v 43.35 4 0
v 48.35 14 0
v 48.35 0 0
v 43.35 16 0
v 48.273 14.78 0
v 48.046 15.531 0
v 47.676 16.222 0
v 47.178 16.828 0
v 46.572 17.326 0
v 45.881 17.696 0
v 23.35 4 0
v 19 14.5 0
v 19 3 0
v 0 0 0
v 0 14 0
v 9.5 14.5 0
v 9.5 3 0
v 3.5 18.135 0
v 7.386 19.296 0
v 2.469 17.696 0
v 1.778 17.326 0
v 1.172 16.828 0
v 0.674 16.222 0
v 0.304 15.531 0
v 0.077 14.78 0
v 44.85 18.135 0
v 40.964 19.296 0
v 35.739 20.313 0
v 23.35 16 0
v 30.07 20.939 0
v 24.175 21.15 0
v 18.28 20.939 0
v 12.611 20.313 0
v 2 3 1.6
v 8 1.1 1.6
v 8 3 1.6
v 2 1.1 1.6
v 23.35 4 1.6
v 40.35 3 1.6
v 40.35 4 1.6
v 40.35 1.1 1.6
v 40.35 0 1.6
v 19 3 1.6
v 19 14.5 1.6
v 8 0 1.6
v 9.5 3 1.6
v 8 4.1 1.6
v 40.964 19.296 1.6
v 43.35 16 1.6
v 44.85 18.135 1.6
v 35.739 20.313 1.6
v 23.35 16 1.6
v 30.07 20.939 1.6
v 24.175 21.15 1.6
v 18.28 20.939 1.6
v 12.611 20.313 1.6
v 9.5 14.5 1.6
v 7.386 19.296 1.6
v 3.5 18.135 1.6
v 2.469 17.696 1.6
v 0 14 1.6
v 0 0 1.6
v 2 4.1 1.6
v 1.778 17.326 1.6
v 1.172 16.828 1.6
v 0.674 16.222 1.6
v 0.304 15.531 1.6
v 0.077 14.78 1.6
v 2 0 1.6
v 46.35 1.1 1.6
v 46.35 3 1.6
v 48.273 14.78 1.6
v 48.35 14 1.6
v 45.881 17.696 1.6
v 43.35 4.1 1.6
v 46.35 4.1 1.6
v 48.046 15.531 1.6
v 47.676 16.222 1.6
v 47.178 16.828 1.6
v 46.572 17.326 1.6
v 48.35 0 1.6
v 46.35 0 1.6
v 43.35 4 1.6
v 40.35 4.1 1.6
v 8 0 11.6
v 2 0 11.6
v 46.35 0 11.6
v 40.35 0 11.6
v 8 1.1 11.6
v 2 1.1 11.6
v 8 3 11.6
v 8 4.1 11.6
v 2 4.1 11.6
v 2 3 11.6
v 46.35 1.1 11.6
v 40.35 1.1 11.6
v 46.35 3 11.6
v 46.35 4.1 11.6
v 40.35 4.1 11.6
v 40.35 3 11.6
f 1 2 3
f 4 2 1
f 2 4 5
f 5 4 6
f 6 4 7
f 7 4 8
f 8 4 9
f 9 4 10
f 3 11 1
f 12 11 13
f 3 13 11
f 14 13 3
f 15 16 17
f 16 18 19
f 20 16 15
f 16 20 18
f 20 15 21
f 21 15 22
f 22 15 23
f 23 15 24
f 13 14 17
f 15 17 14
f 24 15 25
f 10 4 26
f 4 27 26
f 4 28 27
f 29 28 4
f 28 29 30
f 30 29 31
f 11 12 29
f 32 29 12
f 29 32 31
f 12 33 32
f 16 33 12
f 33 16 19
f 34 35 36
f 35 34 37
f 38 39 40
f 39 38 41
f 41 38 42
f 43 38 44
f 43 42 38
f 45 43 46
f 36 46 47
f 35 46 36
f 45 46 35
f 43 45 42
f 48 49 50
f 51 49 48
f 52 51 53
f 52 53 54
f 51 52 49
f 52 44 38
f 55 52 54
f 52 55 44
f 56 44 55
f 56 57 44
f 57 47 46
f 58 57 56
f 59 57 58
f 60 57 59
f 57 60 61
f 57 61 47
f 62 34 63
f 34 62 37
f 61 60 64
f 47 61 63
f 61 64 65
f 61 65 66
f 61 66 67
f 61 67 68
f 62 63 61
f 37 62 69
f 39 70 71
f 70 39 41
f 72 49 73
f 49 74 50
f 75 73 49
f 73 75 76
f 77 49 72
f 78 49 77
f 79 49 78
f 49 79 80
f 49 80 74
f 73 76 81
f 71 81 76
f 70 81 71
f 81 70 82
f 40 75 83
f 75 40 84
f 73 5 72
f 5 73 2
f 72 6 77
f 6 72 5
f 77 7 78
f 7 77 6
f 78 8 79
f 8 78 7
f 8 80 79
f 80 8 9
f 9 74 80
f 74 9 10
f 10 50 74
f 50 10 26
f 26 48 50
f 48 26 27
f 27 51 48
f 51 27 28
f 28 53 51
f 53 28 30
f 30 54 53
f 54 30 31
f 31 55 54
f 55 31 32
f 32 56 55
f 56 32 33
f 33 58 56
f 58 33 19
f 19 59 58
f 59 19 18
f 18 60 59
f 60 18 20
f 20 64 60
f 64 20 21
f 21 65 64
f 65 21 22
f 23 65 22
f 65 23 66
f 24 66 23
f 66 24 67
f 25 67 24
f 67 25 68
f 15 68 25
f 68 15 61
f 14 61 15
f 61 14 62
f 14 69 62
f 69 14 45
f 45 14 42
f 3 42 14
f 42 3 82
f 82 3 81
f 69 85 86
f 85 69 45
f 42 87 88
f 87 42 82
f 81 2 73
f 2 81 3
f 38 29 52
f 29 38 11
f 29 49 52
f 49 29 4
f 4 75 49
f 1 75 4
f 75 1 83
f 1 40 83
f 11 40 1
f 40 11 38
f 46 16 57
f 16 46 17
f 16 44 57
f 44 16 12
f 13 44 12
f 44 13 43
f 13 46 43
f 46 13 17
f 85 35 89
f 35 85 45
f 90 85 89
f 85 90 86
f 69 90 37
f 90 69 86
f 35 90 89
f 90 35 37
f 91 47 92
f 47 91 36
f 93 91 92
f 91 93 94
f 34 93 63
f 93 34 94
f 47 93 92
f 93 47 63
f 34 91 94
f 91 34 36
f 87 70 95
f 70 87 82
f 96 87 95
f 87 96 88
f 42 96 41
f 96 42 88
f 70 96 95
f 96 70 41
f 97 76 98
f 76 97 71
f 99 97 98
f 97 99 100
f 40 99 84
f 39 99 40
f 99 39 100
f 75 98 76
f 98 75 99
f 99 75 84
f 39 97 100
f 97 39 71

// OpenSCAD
include <../libs/pw_primitives.scad>;

$fn = 32;
body_length=78;
body_width=58;
body_height=26.1;
body_fillet_radius=9.5;
base_width=71;
base_wid_offset = (base_width-body_width)/2;
base_thick=2.2;
bolt_offset = 5;
batt_space_length = 70;
batt_space_width = 50;
batt_space_height = 20;
batt_splen_offset = (body_length-batt_space_length)/2;
batt_spwid_offset = (body_width-batt_space_width)/2;
step_width=63.7;
step_thick=5;  // from bottom, not from top of base
step_offset = (base_width-step_width)/2;
tab_cyl_height = 3;
tab_cyl_diam = 30;
tab_cyl_length = 10;
tab_cyl_inset_height = 1;
bolt_head_len = 4;
bolt_shaft_len = 16;

// The actual Trend AirShield battery pack has a solid top box with clips on the
// lower edge, and then the bottom piece has the base and step and holes for the clips.
// For ease of 3D printing and ease of assembly we follow that basic design but
// use bolt / screw holes instead of clips.  The base and step is one part,
// and the top walls, curved top and tab are the other.  Bolts screw in from underneath
// the base to hold the top on.  The top has the cut-outs for the terminals.

module base_bolt(x, y) {
    translate([x, y, (bolt_head_len+bolt_shaft_len-0.01)])
      mirror([0, 0, 1]) flat_head_bolt_hole(3, bolt_shaft_len, 6, bolt_head_len);
};

// The base:
* difference() {
    union() {
        // base
        cube([body_length, base_width, base_thick]);
        // step
        translate([0, step_offset, base_thick])
          cube([body_length, step_width, step_thick]);
    };
    // bolt holes
    base_bolt(bolt_offset, step_offset+bolt_offset);
    base_bolt(body_length-bolt_offset, step_offset+bolt_offset);
    base_bolt(bolt_offset, step_offset+step_width-bolt_offset);
    base_bolt(body_length-bolt_offset, step_offset+step_width-bolt_offset);
};

// The top:
//translate([0, base_width+10, 0]) 
* translate([0, 0, body_height]) mirror([0, 0, 1]) union() {
    difference() {
        union() {
            // body
            translate([0, base_wid_offset, 0]) hull() {
                cube([body_length, body_width, body_height-body_fillet_radius]);
                // note that if body_fillet_radius*2 > body_height, cylinder will
                // stick out below body and we have no fix for that right now.
                translate([0, body_fillet_radius, body_height-body_fillet_radius])
                  rotate([0, 90, 0]) cylinder(h=body_length, r=body_fillet_radius);
                translate([0, body_width-body_fillet_radius, body_height-body_fillet_radius])
                  rotate([0, 90, 0]) cylinder(h=body_length, r=body_fillet_radius);
            }
            // tab
            difference() {
                // main tab body
                translate([(tab_cyl_diam/2)-tab_cyl_length, base_width/2, body_height/2])
                    cylinder(h=tab_cyl_height, d=tab_cyl_diam);
                // top inset cutout
                translate([
                    (tab_cyl_diam/2)-tab_cyl_length, base_width/2,
                    body_height/2+(tab_cyl_height-tab_cyl_inset_height)
                ])
                    cylinder(
                        h=tab_cyl_inset_height+0.01,
                        d=tab_cyl_diam-tab_cyl_inset_height*2
                    );
            };
        }
        // bolt holes
        translate([0, 0, -bolt_head_len]) union() {
            base_bolt(bolt_offset, step_offset+bolt_offset);
            base_bolt(body_length-bolt_offset, step_offset+bolt_offset);
            base_bolt(bolt_offset, step_offset+step_width-bolt_offset);
            base_bolt(body_length-bolt_offset, step_offset+step_width-bolt_offset);
        }
        // battery space
        translate([batt_splen_offset, base_wid_offset+batt_spwid_offset, -0.01])
        cube([batt_space_length, batt_space_width, batt_space_height]);
        
    };
}


// The back of the circuit board.  This has cutouts for the DC jack (right) and the
// switch (in this case an R13-66 switch, but change the switch width and height to
// suit yourself).

bp_max_wid = 48.35;
bp_max_hgt = 21.15;
bp_min_hgt = 18;
bp_thick = 1.6;
bp_cnr_rad = 4;
ellipse_hgt = 22;
// These X and Y measurements are from the LHS when looking FROM THE CIRCUIT
// BOARD DIRECTION.  That's because we have to then print a channel to mount
// the circuit board 'onto' this.
bp_dc_in_w = 9.5; bp_dc_in_h = 11.5;
bp_dc_in_x = 9.5; bp_dc_in_y = 3;
bp_sw_wid = 20; bp_sw_hgt = 12;
bp_sw_x = bp_max_wid-(bp_sw_wid+5); bp_sw_y = 4;
bp_board_h = 1.9;  bp_brd_mt_h = 1.1;  bp_brd_mt_w = 6;  bp_brd_mt_l = 10;
bp_brd_mt_y = bp_dc_in_y - (bp_board_h + bp_brd_mt_h);
bp_brd_mt_x1 = 2;  bp_brd_mt_x2 = bp_max_wid - (bp_brd_mt_w + bp_brd_mt_x1);

union() {
    linear_extrude(bp_thick) difference() {
        hull() {  // faster to do hull on 2d and linear_extrude than with 3D
            intersection() {
                translate([bp_max_wid/2, bp_max_hgt-ellipse_hgt/2, 0])
                  ellipse(bp_max_wid*1.25, ellipse_hgt);
                translate([bp_cnr_rad-0.5, 0])
                  square([bp_max_wid-(bp_cnr_rad-0.5)*2, bp_max_hgt]);
            }
            translate([bp_max_wid-bp_cnr_rad, bp_min_hgt-bp_cnr_rad, 0])
              circle(r=bp_cnr_rad);
            translate([bp_cnr_rad, bp_min_hgt-bp_cnr_rad, 0])
              circle(r=bp_cnr_rad);
            square([bp_max_wid, bp_min_hgt-bp_cnr_rad]);
        }
        // DC jack cutout
        translate([bp_dc_in_x, bp_dc_in_y]) square([bp_dc_in_w, bp_dc_in_h]);
        // Switch cutout
        translate([bp_sw_x, bp_sw_y]) square([bp_sw_wid, bp_sw_hgt]);
    }
    // board mounts
    translate([bp_brd_mt_x1, bp_brd_mt_y, bp_thick])
      cube([bp_brd_mt_w, bp_brd_mt_h, bp_brd_mt_l]);
    translate([bp_brd_mt_x1, bp_brd_mt_y+bp_brd_mt_h+bp_board_h, bp_thick])
      cube([bp_brd_mt_w, bp_brd_mt_h, bp_brd_mt_l]);
    translate([bp_brd_mt_x2, bp_brd_mt_y, bp_thick])
      cube([bp_brd_mt_w, bp_brd_mt_h, bp_brd_mt_l]);
    translate([bp_brd_mt_x2, bp_brd_mt_y+bp_brd_mt_h+bp_board_h, bp_thick])
      cube([bp_brd_mt_w, bp_brd_mt_h, bp_brd_mt_l]);
}
